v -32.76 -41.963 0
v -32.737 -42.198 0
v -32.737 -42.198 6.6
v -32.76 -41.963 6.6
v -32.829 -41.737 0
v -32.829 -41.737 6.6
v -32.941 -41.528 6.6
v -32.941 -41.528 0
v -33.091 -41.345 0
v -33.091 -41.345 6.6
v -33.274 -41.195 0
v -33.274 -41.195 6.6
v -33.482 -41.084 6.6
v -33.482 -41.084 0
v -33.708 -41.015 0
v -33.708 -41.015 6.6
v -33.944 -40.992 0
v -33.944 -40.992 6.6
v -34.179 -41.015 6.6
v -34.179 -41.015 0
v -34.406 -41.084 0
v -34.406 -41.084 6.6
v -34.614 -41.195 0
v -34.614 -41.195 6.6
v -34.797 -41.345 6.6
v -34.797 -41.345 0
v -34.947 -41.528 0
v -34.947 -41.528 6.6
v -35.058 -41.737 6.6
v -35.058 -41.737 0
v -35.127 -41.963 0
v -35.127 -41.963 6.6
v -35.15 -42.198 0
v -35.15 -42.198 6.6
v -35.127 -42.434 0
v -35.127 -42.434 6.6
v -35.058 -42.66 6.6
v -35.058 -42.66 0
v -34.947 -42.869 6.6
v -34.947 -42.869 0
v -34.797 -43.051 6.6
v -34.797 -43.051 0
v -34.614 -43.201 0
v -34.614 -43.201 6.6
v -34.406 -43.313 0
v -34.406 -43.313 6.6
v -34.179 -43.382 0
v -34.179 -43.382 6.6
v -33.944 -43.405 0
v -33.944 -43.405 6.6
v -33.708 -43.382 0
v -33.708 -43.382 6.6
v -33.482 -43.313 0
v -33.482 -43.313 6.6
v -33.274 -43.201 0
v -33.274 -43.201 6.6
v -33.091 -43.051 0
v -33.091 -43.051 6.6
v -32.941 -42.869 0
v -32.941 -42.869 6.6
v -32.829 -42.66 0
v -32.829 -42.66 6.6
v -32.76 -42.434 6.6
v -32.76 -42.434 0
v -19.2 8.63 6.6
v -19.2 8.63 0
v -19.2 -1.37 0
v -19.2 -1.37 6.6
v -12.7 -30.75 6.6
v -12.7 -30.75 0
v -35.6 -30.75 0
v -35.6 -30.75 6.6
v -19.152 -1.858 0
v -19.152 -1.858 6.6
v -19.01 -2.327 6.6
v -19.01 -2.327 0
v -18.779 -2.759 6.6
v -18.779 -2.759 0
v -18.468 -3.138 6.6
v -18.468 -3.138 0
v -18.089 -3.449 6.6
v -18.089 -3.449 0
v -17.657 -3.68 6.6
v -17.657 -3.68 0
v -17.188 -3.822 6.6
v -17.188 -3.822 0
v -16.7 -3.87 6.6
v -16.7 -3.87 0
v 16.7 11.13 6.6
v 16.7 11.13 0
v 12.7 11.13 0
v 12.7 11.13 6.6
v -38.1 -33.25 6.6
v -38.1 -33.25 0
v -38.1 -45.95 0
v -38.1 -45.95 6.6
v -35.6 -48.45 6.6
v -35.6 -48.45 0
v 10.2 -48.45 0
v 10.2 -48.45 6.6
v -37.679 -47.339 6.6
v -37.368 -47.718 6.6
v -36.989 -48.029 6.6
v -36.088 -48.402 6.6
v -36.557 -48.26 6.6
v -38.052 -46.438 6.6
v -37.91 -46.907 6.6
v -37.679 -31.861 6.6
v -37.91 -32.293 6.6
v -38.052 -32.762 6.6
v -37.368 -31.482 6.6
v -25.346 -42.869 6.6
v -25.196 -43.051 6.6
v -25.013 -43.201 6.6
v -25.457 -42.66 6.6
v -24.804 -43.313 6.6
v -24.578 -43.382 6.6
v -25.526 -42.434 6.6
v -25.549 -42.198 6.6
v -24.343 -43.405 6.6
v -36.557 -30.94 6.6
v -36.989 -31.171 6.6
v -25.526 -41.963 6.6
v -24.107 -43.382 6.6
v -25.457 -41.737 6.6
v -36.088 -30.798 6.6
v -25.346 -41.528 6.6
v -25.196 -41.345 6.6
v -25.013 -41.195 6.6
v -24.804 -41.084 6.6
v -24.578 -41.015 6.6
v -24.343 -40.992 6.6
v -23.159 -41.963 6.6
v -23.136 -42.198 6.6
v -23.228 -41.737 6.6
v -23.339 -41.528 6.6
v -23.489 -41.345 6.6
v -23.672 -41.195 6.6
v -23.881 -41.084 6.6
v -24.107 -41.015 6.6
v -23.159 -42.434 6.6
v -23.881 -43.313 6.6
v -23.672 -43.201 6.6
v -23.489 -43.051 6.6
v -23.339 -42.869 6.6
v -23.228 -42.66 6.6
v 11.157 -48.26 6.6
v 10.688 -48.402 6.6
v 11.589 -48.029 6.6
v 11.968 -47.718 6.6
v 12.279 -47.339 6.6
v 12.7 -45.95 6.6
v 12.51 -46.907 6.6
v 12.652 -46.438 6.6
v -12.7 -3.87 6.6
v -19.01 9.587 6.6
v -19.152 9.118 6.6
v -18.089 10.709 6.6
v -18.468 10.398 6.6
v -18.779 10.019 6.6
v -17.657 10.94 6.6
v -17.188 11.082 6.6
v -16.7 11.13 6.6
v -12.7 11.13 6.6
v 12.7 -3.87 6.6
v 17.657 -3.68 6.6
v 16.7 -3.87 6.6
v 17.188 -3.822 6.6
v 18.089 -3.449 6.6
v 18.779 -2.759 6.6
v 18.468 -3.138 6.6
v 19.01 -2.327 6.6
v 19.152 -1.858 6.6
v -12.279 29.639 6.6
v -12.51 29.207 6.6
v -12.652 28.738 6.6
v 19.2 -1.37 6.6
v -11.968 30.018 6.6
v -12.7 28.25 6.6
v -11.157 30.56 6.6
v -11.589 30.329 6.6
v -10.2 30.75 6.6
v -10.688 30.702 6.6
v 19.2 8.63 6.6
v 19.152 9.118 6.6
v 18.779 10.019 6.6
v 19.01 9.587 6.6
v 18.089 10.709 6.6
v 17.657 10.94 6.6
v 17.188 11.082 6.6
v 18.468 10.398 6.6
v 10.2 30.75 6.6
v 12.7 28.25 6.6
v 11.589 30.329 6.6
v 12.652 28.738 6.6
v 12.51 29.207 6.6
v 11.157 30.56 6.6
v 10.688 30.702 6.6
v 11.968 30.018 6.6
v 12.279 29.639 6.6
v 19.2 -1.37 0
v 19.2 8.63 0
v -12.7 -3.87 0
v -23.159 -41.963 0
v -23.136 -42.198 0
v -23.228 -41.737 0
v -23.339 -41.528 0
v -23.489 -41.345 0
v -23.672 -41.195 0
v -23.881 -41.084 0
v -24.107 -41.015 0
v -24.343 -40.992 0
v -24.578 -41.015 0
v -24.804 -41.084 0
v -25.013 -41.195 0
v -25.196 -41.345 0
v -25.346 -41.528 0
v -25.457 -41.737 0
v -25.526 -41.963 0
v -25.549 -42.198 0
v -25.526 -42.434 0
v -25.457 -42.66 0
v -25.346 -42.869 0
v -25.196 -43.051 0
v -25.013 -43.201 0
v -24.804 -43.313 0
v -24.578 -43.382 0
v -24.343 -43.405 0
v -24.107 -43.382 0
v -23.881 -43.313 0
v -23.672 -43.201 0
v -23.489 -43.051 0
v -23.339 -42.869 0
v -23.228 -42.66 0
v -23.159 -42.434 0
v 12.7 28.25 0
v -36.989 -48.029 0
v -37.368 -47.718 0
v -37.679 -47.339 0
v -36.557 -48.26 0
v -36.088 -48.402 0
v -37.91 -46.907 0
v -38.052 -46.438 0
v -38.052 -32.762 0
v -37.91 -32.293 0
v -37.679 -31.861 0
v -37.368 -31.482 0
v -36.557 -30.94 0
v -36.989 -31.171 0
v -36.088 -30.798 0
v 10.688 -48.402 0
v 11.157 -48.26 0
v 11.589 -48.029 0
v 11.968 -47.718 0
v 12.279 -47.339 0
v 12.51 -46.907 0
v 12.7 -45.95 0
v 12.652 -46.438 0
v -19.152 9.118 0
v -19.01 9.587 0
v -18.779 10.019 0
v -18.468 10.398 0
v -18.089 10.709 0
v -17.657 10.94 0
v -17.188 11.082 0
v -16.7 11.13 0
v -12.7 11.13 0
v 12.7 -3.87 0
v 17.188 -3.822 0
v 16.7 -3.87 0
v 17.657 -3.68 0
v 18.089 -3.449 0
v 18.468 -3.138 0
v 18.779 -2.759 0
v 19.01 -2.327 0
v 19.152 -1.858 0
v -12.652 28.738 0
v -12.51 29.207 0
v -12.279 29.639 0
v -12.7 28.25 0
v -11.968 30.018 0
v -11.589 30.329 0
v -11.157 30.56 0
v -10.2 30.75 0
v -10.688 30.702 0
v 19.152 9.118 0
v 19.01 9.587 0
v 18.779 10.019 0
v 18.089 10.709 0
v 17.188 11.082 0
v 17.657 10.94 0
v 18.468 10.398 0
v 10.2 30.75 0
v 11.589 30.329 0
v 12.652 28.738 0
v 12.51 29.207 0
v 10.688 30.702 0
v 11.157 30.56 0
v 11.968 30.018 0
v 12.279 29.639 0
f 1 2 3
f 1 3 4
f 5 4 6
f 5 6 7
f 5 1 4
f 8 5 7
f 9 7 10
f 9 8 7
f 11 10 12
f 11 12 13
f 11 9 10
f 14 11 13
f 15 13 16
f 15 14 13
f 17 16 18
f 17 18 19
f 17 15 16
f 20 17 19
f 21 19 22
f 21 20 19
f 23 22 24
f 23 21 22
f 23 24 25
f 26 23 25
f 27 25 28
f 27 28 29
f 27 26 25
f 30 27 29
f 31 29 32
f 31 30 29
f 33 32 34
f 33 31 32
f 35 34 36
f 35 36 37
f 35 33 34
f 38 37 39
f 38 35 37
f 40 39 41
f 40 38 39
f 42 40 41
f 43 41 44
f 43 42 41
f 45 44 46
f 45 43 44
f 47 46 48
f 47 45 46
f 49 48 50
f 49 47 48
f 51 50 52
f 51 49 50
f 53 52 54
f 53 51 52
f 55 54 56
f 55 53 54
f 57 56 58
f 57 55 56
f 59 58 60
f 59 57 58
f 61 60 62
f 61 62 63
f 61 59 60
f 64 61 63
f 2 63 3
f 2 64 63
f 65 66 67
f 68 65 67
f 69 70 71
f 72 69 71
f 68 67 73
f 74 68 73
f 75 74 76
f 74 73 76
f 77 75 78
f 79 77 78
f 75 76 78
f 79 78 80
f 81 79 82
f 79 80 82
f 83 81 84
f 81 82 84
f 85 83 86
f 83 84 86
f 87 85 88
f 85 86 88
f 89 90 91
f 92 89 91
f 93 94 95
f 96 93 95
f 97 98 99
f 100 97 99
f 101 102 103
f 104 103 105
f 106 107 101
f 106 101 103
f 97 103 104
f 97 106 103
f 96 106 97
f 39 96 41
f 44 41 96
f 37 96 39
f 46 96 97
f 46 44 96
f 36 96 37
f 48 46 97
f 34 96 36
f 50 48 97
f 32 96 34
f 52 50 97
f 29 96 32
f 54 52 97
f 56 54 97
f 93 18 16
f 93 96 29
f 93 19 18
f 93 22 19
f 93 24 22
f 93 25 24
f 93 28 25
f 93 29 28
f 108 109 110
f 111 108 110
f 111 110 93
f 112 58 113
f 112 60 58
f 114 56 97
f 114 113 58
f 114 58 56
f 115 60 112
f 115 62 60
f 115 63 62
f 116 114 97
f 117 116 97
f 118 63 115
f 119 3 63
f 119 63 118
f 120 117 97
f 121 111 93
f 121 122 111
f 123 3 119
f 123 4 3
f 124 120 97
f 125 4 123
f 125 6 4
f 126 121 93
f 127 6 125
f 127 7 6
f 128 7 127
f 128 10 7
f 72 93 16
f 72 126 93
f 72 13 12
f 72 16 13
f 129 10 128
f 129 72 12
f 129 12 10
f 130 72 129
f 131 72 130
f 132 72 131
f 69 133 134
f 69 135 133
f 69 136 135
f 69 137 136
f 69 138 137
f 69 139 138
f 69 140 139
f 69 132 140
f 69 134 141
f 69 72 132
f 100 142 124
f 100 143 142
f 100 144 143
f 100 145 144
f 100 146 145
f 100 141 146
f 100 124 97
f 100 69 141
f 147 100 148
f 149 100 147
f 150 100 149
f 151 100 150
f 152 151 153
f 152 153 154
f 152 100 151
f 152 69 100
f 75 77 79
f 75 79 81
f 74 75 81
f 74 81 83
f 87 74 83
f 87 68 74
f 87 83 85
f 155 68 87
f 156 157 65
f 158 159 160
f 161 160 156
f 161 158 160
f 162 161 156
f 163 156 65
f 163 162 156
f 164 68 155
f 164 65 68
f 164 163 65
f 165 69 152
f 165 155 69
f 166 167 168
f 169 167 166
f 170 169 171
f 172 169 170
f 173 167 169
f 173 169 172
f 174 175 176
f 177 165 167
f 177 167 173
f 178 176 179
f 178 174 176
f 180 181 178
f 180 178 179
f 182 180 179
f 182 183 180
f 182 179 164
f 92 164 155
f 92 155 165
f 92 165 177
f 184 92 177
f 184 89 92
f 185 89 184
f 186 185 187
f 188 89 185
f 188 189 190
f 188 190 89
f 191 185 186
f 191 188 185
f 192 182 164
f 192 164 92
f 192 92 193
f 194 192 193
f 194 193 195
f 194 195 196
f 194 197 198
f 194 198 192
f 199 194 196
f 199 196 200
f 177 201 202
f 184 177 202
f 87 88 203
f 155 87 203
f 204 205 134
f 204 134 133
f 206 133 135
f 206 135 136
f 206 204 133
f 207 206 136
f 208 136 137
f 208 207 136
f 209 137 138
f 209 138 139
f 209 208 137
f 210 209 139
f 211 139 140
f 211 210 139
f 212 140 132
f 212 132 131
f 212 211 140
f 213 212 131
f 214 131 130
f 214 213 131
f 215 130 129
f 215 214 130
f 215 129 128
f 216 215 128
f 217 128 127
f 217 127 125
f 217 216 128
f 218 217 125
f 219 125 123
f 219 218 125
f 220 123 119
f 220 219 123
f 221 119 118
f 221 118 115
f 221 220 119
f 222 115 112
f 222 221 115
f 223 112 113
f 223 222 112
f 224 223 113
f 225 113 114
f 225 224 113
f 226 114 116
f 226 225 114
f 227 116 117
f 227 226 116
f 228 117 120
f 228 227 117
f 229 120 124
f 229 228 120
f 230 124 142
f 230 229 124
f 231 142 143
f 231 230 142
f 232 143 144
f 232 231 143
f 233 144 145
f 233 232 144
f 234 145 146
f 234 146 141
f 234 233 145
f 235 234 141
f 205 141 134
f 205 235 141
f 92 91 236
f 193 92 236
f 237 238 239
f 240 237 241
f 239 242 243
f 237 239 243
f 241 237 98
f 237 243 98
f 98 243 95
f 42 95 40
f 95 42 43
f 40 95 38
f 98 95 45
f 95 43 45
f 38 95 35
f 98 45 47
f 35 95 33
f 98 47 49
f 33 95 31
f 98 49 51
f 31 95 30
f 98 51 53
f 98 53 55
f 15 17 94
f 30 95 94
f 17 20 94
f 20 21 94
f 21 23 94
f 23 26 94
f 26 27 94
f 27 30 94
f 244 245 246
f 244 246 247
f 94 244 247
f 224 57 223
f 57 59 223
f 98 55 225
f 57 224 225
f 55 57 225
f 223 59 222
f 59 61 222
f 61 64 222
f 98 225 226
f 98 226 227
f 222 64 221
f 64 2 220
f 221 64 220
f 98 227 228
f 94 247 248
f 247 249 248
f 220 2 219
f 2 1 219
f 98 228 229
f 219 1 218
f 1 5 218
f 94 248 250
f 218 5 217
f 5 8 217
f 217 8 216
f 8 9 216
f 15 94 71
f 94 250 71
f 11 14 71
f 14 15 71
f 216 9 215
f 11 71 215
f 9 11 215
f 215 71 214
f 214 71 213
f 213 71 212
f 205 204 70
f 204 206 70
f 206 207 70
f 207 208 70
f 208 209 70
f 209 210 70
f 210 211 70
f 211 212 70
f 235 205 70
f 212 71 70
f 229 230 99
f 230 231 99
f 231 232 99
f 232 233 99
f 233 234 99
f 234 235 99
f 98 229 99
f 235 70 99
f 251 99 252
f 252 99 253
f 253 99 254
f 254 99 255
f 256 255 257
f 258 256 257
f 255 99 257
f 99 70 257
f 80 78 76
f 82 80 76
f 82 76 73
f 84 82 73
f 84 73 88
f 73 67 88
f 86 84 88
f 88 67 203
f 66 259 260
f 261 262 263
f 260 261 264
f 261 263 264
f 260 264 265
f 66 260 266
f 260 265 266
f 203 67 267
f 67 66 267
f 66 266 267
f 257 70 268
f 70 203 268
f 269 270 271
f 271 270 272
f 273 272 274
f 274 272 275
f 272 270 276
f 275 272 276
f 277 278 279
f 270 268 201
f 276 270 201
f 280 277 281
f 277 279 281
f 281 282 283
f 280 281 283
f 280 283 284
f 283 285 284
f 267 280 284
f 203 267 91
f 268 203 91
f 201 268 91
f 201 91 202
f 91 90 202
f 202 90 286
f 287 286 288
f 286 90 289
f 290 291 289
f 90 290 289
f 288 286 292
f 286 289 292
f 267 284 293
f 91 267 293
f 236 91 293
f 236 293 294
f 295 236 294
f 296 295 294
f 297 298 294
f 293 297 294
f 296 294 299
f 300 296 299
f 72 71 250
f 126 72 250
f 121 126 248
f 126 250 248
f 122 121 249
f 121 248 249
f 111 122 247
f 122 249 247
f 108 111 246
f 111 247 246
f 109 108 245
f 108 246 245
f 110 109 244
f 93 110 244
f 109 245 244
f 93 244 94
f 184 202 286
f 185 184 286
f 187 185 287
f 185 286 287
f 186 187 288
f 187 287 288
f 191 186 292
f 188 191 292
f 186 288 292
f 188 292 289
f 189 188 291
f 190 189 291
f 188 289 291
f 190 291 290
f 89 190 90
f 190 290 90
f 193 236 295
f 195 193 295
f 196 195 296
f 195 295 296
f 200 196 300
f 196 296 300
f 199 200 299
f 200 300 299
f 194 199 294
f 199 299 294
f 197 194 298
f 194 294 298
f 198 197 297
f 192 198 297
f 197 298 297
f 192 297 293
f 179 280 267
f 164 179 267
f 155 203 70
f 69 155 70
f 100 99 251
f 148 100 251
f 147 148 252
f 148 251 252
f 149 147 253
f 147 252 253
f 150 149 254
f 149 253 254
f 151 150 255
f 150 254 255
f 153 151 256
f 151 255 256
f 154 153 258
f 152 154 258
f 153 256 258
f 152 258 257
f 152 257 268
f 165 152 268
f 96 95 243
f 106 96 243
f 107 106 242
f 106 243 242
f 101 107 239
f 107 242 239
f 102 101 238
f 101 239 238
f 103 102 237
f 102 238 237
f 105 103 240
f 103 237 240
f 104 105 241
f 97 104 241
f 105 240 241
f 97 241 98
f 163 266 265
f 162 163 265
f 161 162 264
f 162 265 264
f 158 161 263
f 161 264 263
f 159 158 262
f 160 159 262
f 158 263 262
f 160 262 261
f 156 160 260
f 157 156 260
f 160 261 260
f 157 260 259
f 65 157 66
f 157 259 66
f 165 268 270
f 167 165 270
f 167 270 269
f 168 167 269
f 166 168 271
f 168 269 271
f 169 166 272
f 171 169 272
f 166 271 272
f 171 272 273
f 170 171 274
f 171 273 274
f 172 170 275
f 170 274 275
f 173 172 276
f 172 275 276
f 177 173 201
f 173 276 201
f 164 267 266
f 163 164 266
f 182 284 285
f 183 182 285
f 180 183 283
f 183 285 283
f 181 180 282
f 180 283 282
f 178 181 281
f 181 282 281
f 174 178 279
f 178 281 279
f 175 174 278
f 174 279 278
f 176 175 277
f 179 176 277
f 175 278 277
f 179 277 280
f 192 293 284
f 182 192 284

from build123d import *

# Parameters (mm, degrees)
MODEL_R             = 1.2065
BOSS_EXTRUDE1_DEPTH = 6.6


with BuildPart() as part:
    # Model → Boss-Extrude1 (new body)
    with BuildSketch(Plane.XY):
        with BuildLine():
            Line((-38.1, -33.25), (-38.1, -45.95))
            ThreePointArc((-38.1, -45.95), (-37.367766953, -47.717766953), (-35.6, -48.45))
            Line((-35.6, -48.45), (10.2, -48.45))
            ThreePointArc((10.2, -48.45), (11.967766953, -47.717766953), (12.7, -45.95))
            Line((12.7, -45.95), (12.7, -3.87))
            Line((12.7, -3.87), (16.7, -3.87))
            ThreePointArc((16.7, -3.87), (18.467766953, -3.137766953), (19.2, -1.37))
            Line((19.2, -1.37), (19.2, 8.63))
            ThreePointArc((19.2, 8.63), (18.467766953, 10.397766953), (16.7, 11.13))
            Line((16.7, 11.13), (12.7, 11.13))
            Line((12.7, 11.13), (12.7, 28.25))
            ThreePointArc((12.7, 28.25), (11.967766953, 30.017766953), (10.2, 30.75))
            Line((10.2, 30.75), (-10.2, 30.75))
            ThreePointArc((-10.2, 30.75), (-11.967766953, 30.017766953), (-12.7, 28.25))
            Line((-12.7, 28.25), (-12.7, 11.13))
            Line((-12.7, 11.13), (-16.7, 11.13))
            ThreePointArc((-16.7, 11.13), (-18.467766953, 10.397766953), (-19.2, 8.63))
            Line((-19.2, 8.63), (-19.2, -1.37))
            ThreePointArc((-19.2, -1.37), (-18.467766953, -3.137766953), (-16.7, -3.87))
            Line((-16.7, -3.87), (-12.7, -3.87))
            Line((-12.7, -3.87), (-12.7, -30.75))
            Line((-12.7, -30.75), (-35.6, -30.75))
            ThreePointArc((-35.6, -30.75), (-37.367766953, -31.482233047), (-38.1, -33.25))
        make_face()
        with Locations((-33.9438, -42.1983)):
            Circle(MODEL_R, mode=Mode.SUBTRACT)
        with Locations((-24.3426, -42.1983)):
            Circle(MODEL_R, mode=Mode.SUBTRACT)
    extrude(amount=BOSS_EXTRUDE1_DEPTH)


solid = part.part
